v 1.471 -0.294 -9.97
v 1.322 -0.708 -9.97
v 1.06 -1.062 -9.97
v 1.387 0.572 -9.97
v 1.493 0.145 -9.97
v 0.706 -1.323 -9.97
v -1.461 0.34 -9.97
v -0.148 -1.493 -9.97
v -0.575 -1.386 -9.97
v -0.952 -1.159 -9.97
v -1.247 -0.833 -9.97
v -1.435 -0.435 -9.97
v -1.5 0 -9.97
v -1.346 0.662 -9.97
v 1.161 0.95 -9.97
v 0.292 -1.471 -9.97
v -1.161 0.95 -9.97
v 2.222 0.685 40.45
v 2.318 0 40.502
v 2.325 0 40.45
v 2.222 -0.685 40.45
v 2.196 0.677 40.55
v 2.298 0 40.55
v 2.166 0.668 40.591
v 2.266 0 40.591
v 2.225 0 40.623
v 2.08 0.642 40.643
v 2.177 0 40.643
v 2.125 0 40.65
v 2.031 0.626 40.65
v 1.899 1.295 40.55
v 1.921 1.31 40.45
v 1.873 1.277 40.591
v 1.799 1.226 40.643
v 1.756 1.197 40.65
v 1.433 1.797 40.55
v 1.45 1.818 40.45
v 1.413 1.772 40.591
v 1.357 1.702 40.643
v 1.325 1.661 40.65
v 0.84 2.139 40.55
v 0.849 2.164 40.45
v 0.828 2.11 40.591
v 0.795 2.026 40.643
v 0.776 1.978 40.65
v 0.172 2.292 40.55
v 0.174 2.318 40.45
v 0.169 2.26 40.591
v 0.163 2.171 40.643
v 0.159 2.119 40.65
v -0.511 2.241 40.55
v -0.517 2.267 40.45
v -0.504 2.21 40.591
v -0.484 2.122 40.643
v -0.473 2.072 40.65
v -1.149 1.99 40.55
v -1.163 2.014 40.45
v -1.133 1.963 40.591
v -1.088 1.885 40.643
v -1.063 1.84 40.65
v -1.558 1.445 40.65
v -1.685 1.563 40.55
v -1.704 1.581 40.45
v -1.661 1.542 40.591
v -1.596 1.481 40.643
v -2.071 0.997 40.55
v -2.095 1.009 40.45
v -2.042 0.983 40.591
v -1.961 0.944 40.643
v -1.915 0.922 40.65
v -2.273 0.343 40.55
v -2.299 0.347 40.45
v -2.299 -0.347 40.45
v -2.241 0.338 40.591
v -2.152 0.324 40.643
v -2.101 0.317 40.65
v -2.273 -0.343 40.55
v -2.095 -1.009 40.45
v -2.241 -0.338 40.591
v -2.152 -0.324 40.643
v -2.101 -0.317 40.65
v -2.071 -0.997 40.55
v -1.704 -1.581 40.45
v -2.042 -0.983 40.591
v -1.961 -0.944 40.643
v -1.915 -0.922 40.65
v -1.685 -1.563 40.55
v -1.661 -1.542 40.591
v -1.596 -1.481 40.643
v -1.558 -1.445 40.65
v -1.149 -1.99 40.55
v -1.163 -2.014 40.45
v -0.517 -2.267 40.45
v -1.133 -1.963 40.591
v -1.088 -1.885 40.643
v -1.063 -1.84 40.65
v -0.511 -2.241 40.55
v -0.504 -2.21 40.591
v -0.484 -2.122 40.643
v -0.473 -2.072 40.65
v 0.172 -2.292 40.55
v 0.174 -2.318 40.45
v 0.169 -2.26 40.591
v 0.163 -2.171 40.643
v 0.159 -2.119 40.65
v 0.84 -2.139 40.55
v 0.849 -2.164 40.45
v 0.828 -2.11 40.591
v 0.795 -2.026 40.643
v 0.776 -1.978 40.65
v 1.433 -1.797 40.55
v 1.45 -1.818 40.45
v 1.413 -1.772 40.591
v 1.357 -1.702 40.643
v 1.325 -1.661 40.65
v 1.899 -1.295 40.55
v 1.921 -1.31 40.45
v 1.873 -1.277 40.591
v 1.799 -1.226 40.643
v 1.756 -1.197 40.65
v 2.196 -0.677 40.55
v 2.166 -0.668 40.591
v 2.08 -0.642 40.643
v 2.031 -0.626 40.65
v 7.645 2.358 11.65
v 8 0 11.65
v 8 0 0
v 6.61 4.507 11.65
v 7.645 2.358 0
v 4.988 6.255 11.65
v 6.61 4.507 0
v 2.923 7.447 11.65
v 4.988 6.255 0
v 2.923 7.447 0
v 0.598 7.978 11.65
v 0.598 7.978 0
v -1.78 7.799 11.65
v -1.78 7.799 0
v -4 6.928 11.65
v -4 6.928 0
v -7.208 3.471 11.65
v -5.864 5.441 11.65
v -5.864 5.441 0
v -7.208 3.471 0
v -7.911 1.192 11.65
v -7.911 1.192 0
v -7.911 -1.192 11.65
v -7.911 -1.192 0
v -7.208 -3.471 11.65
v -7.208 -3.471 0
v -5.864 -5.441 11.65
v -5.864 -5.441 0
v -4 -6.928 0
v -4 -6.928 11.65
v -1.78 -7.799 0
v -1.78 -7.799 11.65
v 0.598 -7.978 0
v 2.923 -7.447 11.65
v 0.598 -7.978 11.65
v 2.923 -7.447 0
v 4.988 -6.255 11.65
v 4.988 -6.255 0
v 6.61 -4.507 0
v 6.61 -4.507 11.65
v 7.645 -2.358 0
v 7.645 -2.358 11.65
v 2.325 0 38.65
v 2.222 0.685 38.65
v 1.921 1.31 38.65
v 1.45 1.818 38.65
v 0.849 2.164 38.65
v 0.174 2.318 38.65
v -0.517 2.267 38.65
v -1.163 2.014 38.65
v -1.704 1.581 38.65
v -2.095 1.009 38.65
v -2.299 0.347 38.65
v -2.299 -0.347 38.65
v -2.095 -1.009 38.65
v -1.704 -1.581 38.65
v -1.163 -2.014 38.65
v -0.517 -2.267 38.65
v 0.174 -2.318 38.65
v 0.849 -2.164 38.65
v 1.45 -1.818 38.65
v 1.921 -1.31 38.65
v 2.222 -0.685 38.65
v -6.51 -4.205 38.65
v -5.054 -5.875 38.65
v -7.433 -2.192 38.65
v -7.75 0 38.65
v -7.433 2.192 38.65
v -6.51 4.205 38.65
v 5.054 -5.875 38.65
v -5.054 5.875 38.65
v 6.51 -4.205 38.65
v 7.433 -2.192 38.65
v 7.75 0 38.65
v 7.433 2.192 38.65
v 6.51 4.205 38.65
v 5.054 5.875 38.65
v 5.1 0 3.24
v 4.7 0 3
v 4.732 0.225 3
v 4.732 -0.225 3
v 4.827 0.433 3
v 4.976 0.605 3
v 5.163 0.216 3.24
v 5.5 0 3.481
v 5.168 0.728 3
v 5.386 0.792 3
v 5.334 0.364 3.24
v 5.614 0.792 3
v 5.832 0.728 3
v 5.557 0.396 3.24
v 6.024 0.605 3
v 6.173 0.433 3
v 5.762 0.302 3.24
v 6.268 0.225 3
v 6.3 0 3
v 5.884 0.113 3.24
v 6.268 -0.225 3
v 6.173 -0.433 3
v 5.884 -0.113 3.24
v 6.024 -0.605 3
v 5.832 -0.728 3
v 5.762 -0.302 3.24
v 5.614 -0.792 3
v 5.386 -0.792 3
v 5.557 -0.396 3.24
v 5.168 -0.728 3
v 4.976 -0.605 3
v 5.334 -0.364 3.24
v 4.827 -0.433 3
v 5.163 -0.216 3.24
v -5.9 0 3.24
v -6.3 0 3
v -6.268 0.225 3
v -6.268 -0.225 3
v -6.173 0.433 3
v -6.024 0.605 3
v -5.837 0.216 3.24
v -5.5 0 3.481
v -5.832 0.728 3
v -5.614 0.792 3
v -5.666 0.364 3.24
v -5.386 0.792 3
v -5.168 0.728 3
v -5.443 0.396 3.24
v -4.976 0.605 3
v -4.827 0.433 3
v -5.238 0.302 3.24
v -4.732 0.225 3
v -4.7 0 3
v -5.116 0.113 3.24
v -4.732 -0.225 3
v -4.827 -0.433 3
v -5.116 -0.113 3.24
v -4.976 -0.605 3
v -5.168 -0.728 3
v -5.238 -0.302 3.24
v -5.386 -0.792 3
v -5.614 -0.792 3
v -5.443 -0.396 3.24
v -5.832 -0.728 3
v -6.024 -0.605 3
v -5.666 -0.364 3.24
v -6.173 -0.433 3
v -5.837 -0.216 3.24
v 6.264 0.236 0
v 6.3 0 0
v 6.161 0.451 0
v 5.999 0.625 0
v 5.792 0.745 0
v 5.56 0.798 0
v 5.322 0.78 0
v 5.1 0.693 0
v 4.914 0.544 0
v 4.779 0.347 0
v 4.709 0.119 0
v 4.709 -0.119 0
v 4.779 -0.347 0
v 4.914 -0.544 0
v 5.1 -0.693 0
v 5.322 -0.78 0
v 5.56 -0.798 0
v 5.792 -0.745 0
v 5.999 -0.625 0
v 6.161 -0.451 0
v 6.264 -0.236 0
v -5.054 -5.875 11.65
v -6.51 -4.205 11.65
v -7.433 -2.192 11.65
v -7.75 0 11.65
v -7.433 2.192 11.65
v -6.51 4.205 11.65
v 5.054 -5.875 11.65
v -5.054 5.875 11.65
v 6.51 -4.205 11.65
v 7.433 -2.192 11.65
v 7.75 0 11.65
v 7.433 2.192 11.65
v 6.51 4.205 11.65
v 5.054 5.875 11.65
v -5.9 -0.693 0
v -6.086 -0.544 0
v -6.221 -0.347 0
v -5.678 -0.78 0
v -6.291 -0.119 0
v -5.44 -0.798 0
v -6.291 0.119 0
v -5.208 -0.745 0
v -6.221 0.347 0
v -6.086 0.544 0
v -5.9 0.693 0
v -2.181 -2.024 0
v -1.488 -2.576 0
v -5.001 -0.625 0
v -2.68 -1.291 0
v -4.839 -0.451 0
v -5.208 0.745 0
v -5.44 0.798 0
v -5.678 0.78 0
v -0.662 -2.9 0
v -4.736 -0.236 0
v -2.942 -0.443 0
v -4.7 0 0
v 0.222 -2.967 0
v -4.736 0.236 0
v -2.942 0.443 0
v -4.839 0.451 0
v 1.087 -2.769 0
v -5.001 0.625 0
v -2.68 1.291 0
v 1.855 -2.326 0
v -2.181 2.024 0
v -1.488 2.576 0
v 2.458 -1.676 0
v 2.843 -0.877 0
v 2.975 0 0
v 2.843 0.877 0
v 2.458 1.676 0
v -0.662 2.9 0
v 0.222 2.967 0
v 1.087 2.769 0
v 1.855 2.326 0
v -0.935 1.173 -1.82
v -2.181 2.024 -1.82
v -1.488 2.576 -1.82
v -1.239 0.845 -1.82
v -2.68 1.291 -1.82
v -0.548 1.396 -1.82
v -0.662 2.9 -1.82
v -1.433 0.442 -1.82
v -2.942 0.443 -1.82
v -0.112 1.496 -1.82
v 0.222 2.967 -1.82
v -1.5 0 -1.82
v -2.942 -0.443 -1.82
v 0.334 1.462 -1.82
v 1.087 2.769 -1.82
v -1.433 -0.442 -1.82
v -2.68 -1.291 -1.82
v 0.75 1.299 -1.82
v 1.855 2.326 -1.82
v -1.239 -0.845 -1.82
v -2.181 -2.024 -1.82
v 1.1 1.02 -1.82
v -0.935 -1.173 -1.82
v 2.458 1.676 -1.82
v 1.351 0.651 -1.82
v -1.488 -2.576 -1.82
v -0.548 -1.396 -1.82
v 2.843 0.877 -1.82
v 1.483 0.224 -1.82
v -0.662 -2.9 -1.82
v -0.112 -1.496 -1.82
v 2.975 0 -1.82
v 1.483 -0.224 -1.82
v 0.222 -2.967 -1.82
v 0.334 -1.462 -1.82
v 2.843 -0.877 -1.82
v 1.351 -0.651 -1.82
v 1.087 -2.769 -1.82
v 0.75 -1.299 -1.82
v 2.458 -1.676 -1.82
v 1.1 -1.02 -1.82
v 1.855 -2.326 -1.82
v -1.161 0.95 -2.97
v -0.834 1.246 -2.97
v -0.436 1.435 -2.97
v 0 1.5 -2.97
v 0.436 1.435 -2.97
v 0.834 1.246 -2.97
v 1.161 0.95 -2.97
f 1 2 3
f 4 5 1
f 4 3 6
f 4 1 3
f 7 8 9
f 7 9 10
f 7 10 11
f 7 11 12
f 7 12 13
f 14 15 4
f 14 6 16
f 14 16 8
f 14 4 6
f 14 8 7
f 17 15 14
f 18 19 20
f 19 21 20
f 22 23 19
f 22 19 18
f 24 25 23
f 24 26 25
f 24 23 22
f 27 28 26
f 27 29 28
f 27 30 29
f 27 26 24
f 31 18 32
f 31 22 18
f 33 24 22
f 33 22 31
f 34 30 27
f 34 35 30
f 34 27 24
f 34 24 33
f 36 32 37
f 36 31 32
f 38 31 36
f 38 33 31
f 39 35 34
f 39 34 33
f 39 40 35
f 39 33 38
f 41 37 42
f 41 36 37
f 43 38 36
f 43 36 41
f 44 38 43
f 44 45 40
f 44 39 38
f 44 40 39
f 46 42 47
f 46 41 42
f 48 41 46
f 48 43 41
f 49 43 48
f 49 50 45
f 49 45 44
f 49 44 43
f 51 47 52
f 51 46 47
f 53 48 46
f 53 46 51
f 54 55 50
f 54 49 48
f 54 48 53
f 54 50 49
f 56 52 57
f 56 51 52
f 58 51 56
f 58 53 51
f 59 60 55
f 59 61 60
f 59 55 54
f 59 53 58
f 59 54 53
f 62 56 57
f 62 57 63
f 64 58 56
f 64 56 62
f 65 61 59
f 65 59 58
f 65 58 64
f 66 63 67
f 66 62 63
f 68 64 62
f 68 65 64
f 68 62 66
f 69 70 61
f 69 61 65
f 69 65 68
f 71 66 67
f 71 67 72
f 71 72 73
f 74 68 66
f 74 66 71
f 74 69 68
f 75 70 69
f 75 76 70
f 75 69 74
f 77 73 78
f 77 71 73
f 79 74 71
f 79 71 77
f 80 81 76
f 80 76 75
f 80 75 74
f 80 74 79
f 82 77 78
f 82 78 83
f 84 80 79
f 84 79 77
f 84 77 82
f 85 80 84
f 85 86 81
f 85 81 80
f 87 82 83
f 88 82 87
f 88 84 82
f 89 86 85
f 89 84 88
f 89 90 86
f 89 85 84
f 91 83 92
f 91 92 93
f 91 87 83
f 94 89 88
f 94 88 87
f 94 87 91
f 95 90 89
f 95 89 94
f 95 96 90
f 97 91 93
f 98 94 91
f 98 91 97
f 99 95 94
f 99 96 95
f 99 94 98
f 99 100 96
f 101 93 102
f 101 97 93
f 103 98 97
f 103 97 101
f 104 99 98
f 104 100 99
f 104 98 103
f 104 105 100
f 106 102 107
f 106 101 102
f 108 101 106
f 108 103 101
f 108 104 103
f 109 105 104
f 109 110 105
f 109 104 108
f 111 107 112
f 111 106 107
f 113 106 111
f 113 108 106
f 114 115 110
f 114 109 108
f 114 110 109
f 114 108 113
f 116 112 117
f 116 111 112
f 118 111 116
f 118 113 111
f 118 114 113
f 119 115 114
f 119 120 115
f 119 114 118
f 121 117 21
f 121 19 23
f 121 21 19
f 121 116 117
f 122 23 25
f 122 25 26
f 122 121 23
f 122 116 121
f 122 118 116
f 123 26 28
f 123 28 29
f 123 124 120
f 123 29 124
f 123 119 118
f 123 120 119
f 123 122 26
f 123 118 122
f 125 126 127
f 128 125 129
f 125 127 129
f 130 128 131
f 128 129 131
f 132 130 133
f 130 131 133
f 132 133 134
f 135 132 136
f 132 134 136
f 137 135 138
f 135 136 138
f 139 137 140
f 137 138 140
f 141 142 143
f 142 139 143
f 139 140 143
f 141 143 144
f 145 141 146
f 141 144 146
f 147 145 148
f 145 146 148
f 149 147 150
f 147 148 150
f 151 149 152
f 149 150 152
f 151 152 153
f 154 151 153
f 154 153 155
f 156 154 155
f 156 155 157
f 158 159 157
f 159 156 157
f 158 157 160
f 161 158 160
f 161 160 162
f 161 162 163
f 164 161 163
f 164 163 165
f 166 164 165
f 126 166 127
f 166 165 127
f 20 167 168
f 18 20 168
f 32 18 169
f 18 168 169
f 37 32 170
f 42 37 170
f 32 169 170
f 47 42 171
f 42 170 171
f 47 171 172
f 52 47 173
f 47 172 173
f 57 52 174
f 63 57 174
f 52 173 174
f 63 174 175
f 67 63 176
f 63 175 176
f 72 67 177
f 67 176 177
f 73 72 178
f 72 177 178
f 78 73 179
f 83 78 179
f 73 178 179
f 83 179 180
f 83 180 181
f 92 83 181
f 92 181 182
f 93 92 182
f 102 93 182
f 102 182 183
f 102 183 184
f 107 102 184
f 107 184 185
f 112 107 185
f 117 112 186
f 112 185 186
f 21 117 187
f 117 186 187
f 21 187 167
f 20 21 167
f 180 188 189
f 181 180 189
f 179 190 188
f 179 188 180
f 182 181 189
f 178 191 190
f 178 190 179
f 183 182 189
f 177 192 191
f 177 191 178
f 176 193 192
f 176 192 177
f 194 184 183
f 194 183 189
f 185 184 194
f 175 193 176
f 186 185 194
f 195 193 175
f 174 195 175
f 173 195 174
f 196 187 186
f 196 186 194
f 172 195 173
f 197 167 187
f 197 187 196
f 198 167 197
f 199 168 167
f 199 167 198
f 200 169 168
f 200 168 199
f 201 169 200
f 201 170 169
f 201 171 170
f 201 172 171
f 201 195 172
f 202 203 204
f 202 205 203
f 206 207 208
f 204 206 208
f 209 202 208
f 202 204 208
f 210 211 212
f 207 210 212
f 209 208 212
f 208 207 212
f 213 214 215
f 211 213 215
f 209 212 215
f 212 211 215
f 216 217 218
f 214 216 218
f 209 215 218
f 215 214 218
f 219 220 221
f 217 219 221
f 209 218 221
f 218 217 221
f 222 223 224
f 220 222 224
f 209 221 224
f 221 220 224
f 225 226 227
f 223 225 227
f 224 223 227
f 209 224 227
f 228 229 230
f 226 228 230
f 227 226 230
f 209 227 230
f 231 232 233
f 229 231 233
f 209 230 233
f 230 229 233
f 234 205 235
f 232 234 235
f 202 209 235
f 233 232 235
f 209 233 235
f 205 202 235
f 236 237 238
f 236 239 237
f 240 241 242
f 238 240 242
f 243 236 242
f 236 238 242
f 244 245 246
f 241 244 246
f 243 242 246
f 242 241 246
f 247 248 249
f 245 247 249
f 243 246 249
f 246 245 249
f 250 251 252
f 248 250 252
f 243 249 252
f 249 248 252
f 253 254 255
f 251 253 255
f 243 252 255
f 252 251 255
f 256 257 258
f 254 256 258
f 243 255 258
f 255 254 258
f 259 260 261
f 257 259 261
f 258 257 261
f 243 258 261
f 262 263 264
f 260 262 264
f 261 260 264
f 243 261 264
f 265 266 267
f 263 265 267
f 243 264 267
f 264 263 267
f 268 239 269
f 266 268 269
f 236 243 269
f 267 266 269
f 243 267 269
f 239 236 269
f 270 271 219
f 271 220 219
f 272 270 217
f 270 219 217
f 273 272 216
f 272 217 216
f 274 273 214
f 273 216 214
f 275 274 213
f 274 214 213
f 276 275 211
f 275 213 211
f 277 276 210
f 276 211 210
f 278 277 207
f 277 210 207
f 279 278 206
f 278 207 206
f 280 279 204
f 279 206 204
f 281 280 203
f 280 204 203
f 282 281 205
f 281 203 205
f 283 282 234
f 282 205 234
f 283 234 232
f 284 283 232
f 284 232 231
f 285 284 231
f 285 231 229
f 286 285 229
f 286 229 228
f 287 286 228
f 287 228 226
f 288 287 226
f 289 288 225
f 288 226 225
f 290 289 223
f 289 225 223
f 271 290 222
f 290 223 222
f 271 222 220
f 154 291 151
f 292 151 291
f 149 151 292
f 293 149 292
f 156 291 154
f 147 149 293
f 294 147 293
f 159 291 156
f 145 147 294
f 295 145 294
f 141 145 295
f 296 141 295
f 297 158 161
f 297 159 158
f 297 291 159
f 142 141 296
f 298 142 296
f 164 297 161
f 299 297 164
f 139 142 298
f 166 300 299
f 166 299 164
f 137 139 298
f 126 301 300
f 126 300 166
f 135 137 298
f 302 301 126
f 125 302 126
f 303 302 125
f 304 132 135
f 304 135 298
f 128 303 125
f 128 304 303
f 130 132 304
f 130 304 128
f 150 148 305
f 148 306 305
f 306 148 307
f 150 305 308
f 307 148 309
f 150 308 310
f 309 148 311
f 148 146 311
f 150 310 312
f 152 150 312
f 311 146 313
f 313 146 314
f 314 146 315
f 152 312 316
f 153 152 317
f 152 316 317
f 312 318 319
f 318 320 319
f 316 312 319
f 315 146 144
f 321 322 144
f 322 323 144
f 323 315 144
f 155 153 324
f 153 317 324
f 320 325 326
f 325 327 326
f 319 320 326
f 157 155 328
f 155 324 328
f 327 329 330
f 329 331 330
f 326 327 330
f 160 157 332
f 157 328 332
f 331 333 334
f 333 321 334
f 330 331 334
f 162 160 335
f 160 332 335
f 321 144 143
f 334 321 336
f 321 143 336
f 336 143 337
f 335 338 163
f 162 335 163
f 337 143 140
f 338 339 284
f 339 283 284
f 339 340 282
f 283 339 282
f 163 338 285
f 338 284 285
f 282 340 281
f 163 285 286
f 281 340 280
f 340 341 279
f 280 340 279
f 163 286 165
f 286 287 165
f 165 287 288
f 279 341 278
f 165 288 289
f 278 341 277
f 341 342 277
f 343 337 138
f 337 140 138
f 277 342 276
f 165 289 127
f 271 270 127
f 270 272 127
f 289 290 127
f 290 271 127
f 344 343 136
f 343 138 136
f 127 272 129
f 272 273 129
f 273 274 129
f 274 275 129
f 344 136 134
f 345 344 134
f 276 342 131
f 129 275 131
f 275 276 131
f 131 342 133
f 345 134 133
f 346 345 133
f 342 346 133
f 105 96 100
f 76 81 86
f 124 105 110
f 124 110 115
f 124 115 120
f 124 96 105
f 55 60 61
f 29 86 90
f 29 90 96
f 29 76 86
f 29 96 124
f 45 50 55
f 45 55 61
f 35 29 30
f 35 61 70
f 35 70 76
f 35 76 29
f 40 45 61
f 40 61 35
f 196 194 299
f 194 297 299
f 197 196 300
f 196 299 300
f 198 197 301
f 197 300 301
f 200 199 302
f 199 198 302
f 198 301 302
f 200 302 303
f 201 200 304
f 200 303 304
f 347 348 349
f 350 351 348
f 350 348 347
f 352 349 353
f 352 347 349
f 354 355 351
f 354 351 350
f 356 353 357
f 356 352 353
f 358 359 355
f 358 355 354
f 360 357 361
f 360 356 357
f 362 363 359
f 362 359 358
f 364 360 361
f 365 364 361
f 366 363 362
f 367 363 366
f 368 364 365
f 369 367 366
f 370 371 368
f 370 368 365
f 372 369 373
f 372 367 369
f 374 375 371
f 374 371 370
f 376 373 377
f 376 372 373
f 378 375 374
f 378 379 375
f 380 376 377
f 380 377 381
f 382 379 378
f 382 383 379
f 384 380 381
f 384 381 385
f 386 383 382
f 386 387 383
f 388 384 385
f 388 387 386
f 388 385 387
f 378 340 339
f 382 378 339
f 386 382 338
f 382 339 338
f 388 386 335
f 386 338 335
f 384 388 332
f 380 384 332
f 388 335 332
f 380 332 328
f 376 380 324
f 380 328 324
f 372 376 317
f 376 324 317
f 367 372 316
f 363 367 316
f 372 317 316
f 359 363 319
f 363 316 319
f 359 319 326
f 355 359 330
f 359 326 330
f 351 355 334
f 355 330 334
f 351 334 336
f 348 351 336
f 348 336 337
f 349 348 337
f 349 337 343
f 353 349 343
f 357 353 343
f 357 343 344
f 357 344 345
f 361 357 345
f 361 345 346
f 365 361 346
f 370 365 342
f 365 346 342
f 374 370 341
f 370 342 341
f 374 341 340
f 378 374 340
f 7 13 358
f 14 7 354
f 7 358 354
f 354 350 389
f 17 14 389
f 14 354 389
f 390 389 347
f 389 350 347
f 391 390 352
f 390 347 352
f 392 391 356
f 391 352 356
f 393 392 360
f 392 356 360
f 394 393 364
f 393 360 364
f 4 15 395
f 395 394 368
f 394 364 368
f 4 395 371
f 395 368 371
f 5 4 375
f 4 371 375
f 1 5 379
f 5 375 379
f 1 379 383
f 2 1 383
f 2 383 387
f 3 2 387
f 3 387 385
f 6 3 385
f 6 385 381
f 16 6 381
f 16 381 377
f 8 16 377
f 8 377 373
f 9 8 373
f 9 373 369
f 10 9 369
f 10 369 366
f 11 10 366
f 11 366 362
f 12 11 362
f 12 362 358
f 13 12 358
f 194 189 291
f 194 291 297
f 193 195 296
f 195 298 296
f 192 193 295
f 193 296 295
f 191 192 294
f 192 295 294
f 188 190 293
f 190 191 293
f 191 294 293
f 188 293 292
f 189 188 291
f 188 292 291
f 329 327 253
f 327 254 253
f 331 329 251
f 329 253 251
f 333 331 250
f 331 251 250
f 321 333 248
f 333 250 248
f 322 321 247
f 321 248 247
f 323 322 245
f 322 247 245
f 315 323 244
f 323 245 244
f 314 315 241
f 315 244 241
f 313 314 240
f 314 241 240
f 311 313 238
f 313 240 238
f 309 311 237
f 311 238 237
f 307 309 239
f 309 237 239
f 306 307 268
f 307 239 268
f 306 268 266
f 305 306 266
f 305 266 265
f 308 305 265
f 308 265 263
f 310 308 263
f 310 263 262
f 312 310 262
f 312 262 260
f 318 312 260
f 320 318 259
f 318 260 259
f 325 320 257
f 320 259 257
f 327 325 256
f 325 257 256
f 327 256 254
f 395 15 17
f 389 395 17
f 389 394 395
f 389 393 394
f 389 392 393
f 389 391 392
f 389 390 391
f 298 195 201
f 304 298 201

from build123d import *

# Parameters (mm, degrees)
SKETCH1_R                       = 8
BOSS_EXTRUDE1_DEPTH             = 11.65
SKETCH2_R                       = 2.975
BOSS_EXTRUDE2_DEPTH             = 1.82
SKETCH3_R                       = 1.5
BOSS_EXTRUDE3_DEPTH             = 8.15
SKETCH4_W                       = 2.321637354
SKETCH4_H                       = 1.249395682
CUT_EXTRUDE1_DEPTH              = 7
SKETCH5_R                       = 7.75
BOSS_EXTRUDE4_DEPTH             = 27
SKETCH6_W                       = 10.10878331
SKETCH6_H                       = 2.575875473
CUT_EXTRUDE2_DEPTH              = 27
SKETCH7_R                       = 2.325
BOSS_EXTRUDE6_DEPTH             = 2
FILLET1_R                       = 0.2
TAP_DRILL_FOR_M2X0_4_TAP1_D     = 1.6
TAP_DRILL_FOR_M2X0_4_TAP1_DEPTH = 3
TAP_DRILL_FOR_M2X0_4_TAP1_TIP   = 0.480688495


with BuildPart() as part:
    # Sketch1 → Boss-Extrude1 (new body)
    with BuildSketch(Plane.XY):
        Circle(SKETCH1_R)
    extrude(amount=BOSS_EXTRUDE1_DEPTH)

    # Sketch2 → Boss-Extrude2 (add)
    with BuildSketch(Plane(origin=(0, 0, 0), x_dir=(-1, 0, 0), z_dir=(0, 0, -1))):
        with Locations(Location((0, 0, 0), (0, 0, 180))):
            Circle(SKETCH2_R)
    extrude(amount=BOSS_EXTRUDE2_DEPTH)

    # Sketch3 → Boss-Extrude3 (add)
    with BuildSketch(Plane(origin=(0, 0, -1.82), x_dir=(-1, 0, 0), z_dir=(0, 0, -1))):
        Circle(SKETCH3_R)
    extrude(amount=BOSS_EXTRUDE3_DEPTH)

    # Sketch4 → Cut-Extrude1 (cut)
    with BuildSketch(Plane(origin=(0, 0, -9.97), x_dir=(-1, 0, 0), z_dir=(0, 0, -1))):
        with Locations((0, 1.574697841)):
            Rectangle(SKETCH4_W, SKETCH4_H)
    extrude(amount=-CUT_EXTRUDE1_DEPTH, mode=Mode.SUBTRACT)

    # Sketch5 → Boss-Extrude4 (add)
    with BuildSketch(Plane.XY.offset(11.65)):
        Circle(SKETCH5_R)
    extrude(amount=BOSS_EXTRUDE4_DEPTH)

    # Sketch6 → Cut-Extrude2 (cut)
    with BuildSketch(Plane.XY.offset(38.65)):
        with Locations((0, -7.162937736)):
            Rectangle(SKETCH6_W, SKETCH6_H)
    cut_extrude2 = extrude(amount=-CUT_EXTRUDE2_DEPTH, mode=Mode.SUBTRACT)

    # Mirror1: Cut-Extrude2 across plane
    add(cut_extrude2.mirror(Plane.ZX), mode=Mode.SUBTRACT)

    # Sketch7 → Boss-Extrude6 (add)
    with BuildSketch(Plane.XY.offset(38.65)):
        Circle(SKETCH7_R)
    extrude(amount=BOSS_EXTRUDE6_DEPTH)

    # Fillet1
    fillet1_edges = [part.edges().sort_by_distance(p)[0] for p in [
        (-2.325, 0, 40.65),
    ]]
    fillet(fillet1_edges, radius=FILLET1_R)

    # Tap Drill for M2x0.4 Tap1
    with Locations(Plane(origin=(0, 0, 0), x_dir=(-1, 0, 0), z_dir=(0, 0, -1))):
        with Locations((-5.5, 0), (5.5, 0)):
            Hole(TAP_DRILL_FOR_M2X0_4_TAP1_D / 2, depth=TAP_DRILL_FOR_M2X0_4_TAP1_DEPTH)
            with Locations((0, 0, -(TAP_DRILL_FOR_M2X0_4_TAP1_DEPTH + TAP_DRILL_FOR_M2X0_4_TAP1_TIP / 2))):  # 118° drill point
                Cone(0, TAP_DRILL_FOR_M2X0_4_TAP1_D / 2, TAP_DRILL_FOR_M2X0_4_TAP1_TIP, mode=Mode.SUBTRACT)


solid = part.part
